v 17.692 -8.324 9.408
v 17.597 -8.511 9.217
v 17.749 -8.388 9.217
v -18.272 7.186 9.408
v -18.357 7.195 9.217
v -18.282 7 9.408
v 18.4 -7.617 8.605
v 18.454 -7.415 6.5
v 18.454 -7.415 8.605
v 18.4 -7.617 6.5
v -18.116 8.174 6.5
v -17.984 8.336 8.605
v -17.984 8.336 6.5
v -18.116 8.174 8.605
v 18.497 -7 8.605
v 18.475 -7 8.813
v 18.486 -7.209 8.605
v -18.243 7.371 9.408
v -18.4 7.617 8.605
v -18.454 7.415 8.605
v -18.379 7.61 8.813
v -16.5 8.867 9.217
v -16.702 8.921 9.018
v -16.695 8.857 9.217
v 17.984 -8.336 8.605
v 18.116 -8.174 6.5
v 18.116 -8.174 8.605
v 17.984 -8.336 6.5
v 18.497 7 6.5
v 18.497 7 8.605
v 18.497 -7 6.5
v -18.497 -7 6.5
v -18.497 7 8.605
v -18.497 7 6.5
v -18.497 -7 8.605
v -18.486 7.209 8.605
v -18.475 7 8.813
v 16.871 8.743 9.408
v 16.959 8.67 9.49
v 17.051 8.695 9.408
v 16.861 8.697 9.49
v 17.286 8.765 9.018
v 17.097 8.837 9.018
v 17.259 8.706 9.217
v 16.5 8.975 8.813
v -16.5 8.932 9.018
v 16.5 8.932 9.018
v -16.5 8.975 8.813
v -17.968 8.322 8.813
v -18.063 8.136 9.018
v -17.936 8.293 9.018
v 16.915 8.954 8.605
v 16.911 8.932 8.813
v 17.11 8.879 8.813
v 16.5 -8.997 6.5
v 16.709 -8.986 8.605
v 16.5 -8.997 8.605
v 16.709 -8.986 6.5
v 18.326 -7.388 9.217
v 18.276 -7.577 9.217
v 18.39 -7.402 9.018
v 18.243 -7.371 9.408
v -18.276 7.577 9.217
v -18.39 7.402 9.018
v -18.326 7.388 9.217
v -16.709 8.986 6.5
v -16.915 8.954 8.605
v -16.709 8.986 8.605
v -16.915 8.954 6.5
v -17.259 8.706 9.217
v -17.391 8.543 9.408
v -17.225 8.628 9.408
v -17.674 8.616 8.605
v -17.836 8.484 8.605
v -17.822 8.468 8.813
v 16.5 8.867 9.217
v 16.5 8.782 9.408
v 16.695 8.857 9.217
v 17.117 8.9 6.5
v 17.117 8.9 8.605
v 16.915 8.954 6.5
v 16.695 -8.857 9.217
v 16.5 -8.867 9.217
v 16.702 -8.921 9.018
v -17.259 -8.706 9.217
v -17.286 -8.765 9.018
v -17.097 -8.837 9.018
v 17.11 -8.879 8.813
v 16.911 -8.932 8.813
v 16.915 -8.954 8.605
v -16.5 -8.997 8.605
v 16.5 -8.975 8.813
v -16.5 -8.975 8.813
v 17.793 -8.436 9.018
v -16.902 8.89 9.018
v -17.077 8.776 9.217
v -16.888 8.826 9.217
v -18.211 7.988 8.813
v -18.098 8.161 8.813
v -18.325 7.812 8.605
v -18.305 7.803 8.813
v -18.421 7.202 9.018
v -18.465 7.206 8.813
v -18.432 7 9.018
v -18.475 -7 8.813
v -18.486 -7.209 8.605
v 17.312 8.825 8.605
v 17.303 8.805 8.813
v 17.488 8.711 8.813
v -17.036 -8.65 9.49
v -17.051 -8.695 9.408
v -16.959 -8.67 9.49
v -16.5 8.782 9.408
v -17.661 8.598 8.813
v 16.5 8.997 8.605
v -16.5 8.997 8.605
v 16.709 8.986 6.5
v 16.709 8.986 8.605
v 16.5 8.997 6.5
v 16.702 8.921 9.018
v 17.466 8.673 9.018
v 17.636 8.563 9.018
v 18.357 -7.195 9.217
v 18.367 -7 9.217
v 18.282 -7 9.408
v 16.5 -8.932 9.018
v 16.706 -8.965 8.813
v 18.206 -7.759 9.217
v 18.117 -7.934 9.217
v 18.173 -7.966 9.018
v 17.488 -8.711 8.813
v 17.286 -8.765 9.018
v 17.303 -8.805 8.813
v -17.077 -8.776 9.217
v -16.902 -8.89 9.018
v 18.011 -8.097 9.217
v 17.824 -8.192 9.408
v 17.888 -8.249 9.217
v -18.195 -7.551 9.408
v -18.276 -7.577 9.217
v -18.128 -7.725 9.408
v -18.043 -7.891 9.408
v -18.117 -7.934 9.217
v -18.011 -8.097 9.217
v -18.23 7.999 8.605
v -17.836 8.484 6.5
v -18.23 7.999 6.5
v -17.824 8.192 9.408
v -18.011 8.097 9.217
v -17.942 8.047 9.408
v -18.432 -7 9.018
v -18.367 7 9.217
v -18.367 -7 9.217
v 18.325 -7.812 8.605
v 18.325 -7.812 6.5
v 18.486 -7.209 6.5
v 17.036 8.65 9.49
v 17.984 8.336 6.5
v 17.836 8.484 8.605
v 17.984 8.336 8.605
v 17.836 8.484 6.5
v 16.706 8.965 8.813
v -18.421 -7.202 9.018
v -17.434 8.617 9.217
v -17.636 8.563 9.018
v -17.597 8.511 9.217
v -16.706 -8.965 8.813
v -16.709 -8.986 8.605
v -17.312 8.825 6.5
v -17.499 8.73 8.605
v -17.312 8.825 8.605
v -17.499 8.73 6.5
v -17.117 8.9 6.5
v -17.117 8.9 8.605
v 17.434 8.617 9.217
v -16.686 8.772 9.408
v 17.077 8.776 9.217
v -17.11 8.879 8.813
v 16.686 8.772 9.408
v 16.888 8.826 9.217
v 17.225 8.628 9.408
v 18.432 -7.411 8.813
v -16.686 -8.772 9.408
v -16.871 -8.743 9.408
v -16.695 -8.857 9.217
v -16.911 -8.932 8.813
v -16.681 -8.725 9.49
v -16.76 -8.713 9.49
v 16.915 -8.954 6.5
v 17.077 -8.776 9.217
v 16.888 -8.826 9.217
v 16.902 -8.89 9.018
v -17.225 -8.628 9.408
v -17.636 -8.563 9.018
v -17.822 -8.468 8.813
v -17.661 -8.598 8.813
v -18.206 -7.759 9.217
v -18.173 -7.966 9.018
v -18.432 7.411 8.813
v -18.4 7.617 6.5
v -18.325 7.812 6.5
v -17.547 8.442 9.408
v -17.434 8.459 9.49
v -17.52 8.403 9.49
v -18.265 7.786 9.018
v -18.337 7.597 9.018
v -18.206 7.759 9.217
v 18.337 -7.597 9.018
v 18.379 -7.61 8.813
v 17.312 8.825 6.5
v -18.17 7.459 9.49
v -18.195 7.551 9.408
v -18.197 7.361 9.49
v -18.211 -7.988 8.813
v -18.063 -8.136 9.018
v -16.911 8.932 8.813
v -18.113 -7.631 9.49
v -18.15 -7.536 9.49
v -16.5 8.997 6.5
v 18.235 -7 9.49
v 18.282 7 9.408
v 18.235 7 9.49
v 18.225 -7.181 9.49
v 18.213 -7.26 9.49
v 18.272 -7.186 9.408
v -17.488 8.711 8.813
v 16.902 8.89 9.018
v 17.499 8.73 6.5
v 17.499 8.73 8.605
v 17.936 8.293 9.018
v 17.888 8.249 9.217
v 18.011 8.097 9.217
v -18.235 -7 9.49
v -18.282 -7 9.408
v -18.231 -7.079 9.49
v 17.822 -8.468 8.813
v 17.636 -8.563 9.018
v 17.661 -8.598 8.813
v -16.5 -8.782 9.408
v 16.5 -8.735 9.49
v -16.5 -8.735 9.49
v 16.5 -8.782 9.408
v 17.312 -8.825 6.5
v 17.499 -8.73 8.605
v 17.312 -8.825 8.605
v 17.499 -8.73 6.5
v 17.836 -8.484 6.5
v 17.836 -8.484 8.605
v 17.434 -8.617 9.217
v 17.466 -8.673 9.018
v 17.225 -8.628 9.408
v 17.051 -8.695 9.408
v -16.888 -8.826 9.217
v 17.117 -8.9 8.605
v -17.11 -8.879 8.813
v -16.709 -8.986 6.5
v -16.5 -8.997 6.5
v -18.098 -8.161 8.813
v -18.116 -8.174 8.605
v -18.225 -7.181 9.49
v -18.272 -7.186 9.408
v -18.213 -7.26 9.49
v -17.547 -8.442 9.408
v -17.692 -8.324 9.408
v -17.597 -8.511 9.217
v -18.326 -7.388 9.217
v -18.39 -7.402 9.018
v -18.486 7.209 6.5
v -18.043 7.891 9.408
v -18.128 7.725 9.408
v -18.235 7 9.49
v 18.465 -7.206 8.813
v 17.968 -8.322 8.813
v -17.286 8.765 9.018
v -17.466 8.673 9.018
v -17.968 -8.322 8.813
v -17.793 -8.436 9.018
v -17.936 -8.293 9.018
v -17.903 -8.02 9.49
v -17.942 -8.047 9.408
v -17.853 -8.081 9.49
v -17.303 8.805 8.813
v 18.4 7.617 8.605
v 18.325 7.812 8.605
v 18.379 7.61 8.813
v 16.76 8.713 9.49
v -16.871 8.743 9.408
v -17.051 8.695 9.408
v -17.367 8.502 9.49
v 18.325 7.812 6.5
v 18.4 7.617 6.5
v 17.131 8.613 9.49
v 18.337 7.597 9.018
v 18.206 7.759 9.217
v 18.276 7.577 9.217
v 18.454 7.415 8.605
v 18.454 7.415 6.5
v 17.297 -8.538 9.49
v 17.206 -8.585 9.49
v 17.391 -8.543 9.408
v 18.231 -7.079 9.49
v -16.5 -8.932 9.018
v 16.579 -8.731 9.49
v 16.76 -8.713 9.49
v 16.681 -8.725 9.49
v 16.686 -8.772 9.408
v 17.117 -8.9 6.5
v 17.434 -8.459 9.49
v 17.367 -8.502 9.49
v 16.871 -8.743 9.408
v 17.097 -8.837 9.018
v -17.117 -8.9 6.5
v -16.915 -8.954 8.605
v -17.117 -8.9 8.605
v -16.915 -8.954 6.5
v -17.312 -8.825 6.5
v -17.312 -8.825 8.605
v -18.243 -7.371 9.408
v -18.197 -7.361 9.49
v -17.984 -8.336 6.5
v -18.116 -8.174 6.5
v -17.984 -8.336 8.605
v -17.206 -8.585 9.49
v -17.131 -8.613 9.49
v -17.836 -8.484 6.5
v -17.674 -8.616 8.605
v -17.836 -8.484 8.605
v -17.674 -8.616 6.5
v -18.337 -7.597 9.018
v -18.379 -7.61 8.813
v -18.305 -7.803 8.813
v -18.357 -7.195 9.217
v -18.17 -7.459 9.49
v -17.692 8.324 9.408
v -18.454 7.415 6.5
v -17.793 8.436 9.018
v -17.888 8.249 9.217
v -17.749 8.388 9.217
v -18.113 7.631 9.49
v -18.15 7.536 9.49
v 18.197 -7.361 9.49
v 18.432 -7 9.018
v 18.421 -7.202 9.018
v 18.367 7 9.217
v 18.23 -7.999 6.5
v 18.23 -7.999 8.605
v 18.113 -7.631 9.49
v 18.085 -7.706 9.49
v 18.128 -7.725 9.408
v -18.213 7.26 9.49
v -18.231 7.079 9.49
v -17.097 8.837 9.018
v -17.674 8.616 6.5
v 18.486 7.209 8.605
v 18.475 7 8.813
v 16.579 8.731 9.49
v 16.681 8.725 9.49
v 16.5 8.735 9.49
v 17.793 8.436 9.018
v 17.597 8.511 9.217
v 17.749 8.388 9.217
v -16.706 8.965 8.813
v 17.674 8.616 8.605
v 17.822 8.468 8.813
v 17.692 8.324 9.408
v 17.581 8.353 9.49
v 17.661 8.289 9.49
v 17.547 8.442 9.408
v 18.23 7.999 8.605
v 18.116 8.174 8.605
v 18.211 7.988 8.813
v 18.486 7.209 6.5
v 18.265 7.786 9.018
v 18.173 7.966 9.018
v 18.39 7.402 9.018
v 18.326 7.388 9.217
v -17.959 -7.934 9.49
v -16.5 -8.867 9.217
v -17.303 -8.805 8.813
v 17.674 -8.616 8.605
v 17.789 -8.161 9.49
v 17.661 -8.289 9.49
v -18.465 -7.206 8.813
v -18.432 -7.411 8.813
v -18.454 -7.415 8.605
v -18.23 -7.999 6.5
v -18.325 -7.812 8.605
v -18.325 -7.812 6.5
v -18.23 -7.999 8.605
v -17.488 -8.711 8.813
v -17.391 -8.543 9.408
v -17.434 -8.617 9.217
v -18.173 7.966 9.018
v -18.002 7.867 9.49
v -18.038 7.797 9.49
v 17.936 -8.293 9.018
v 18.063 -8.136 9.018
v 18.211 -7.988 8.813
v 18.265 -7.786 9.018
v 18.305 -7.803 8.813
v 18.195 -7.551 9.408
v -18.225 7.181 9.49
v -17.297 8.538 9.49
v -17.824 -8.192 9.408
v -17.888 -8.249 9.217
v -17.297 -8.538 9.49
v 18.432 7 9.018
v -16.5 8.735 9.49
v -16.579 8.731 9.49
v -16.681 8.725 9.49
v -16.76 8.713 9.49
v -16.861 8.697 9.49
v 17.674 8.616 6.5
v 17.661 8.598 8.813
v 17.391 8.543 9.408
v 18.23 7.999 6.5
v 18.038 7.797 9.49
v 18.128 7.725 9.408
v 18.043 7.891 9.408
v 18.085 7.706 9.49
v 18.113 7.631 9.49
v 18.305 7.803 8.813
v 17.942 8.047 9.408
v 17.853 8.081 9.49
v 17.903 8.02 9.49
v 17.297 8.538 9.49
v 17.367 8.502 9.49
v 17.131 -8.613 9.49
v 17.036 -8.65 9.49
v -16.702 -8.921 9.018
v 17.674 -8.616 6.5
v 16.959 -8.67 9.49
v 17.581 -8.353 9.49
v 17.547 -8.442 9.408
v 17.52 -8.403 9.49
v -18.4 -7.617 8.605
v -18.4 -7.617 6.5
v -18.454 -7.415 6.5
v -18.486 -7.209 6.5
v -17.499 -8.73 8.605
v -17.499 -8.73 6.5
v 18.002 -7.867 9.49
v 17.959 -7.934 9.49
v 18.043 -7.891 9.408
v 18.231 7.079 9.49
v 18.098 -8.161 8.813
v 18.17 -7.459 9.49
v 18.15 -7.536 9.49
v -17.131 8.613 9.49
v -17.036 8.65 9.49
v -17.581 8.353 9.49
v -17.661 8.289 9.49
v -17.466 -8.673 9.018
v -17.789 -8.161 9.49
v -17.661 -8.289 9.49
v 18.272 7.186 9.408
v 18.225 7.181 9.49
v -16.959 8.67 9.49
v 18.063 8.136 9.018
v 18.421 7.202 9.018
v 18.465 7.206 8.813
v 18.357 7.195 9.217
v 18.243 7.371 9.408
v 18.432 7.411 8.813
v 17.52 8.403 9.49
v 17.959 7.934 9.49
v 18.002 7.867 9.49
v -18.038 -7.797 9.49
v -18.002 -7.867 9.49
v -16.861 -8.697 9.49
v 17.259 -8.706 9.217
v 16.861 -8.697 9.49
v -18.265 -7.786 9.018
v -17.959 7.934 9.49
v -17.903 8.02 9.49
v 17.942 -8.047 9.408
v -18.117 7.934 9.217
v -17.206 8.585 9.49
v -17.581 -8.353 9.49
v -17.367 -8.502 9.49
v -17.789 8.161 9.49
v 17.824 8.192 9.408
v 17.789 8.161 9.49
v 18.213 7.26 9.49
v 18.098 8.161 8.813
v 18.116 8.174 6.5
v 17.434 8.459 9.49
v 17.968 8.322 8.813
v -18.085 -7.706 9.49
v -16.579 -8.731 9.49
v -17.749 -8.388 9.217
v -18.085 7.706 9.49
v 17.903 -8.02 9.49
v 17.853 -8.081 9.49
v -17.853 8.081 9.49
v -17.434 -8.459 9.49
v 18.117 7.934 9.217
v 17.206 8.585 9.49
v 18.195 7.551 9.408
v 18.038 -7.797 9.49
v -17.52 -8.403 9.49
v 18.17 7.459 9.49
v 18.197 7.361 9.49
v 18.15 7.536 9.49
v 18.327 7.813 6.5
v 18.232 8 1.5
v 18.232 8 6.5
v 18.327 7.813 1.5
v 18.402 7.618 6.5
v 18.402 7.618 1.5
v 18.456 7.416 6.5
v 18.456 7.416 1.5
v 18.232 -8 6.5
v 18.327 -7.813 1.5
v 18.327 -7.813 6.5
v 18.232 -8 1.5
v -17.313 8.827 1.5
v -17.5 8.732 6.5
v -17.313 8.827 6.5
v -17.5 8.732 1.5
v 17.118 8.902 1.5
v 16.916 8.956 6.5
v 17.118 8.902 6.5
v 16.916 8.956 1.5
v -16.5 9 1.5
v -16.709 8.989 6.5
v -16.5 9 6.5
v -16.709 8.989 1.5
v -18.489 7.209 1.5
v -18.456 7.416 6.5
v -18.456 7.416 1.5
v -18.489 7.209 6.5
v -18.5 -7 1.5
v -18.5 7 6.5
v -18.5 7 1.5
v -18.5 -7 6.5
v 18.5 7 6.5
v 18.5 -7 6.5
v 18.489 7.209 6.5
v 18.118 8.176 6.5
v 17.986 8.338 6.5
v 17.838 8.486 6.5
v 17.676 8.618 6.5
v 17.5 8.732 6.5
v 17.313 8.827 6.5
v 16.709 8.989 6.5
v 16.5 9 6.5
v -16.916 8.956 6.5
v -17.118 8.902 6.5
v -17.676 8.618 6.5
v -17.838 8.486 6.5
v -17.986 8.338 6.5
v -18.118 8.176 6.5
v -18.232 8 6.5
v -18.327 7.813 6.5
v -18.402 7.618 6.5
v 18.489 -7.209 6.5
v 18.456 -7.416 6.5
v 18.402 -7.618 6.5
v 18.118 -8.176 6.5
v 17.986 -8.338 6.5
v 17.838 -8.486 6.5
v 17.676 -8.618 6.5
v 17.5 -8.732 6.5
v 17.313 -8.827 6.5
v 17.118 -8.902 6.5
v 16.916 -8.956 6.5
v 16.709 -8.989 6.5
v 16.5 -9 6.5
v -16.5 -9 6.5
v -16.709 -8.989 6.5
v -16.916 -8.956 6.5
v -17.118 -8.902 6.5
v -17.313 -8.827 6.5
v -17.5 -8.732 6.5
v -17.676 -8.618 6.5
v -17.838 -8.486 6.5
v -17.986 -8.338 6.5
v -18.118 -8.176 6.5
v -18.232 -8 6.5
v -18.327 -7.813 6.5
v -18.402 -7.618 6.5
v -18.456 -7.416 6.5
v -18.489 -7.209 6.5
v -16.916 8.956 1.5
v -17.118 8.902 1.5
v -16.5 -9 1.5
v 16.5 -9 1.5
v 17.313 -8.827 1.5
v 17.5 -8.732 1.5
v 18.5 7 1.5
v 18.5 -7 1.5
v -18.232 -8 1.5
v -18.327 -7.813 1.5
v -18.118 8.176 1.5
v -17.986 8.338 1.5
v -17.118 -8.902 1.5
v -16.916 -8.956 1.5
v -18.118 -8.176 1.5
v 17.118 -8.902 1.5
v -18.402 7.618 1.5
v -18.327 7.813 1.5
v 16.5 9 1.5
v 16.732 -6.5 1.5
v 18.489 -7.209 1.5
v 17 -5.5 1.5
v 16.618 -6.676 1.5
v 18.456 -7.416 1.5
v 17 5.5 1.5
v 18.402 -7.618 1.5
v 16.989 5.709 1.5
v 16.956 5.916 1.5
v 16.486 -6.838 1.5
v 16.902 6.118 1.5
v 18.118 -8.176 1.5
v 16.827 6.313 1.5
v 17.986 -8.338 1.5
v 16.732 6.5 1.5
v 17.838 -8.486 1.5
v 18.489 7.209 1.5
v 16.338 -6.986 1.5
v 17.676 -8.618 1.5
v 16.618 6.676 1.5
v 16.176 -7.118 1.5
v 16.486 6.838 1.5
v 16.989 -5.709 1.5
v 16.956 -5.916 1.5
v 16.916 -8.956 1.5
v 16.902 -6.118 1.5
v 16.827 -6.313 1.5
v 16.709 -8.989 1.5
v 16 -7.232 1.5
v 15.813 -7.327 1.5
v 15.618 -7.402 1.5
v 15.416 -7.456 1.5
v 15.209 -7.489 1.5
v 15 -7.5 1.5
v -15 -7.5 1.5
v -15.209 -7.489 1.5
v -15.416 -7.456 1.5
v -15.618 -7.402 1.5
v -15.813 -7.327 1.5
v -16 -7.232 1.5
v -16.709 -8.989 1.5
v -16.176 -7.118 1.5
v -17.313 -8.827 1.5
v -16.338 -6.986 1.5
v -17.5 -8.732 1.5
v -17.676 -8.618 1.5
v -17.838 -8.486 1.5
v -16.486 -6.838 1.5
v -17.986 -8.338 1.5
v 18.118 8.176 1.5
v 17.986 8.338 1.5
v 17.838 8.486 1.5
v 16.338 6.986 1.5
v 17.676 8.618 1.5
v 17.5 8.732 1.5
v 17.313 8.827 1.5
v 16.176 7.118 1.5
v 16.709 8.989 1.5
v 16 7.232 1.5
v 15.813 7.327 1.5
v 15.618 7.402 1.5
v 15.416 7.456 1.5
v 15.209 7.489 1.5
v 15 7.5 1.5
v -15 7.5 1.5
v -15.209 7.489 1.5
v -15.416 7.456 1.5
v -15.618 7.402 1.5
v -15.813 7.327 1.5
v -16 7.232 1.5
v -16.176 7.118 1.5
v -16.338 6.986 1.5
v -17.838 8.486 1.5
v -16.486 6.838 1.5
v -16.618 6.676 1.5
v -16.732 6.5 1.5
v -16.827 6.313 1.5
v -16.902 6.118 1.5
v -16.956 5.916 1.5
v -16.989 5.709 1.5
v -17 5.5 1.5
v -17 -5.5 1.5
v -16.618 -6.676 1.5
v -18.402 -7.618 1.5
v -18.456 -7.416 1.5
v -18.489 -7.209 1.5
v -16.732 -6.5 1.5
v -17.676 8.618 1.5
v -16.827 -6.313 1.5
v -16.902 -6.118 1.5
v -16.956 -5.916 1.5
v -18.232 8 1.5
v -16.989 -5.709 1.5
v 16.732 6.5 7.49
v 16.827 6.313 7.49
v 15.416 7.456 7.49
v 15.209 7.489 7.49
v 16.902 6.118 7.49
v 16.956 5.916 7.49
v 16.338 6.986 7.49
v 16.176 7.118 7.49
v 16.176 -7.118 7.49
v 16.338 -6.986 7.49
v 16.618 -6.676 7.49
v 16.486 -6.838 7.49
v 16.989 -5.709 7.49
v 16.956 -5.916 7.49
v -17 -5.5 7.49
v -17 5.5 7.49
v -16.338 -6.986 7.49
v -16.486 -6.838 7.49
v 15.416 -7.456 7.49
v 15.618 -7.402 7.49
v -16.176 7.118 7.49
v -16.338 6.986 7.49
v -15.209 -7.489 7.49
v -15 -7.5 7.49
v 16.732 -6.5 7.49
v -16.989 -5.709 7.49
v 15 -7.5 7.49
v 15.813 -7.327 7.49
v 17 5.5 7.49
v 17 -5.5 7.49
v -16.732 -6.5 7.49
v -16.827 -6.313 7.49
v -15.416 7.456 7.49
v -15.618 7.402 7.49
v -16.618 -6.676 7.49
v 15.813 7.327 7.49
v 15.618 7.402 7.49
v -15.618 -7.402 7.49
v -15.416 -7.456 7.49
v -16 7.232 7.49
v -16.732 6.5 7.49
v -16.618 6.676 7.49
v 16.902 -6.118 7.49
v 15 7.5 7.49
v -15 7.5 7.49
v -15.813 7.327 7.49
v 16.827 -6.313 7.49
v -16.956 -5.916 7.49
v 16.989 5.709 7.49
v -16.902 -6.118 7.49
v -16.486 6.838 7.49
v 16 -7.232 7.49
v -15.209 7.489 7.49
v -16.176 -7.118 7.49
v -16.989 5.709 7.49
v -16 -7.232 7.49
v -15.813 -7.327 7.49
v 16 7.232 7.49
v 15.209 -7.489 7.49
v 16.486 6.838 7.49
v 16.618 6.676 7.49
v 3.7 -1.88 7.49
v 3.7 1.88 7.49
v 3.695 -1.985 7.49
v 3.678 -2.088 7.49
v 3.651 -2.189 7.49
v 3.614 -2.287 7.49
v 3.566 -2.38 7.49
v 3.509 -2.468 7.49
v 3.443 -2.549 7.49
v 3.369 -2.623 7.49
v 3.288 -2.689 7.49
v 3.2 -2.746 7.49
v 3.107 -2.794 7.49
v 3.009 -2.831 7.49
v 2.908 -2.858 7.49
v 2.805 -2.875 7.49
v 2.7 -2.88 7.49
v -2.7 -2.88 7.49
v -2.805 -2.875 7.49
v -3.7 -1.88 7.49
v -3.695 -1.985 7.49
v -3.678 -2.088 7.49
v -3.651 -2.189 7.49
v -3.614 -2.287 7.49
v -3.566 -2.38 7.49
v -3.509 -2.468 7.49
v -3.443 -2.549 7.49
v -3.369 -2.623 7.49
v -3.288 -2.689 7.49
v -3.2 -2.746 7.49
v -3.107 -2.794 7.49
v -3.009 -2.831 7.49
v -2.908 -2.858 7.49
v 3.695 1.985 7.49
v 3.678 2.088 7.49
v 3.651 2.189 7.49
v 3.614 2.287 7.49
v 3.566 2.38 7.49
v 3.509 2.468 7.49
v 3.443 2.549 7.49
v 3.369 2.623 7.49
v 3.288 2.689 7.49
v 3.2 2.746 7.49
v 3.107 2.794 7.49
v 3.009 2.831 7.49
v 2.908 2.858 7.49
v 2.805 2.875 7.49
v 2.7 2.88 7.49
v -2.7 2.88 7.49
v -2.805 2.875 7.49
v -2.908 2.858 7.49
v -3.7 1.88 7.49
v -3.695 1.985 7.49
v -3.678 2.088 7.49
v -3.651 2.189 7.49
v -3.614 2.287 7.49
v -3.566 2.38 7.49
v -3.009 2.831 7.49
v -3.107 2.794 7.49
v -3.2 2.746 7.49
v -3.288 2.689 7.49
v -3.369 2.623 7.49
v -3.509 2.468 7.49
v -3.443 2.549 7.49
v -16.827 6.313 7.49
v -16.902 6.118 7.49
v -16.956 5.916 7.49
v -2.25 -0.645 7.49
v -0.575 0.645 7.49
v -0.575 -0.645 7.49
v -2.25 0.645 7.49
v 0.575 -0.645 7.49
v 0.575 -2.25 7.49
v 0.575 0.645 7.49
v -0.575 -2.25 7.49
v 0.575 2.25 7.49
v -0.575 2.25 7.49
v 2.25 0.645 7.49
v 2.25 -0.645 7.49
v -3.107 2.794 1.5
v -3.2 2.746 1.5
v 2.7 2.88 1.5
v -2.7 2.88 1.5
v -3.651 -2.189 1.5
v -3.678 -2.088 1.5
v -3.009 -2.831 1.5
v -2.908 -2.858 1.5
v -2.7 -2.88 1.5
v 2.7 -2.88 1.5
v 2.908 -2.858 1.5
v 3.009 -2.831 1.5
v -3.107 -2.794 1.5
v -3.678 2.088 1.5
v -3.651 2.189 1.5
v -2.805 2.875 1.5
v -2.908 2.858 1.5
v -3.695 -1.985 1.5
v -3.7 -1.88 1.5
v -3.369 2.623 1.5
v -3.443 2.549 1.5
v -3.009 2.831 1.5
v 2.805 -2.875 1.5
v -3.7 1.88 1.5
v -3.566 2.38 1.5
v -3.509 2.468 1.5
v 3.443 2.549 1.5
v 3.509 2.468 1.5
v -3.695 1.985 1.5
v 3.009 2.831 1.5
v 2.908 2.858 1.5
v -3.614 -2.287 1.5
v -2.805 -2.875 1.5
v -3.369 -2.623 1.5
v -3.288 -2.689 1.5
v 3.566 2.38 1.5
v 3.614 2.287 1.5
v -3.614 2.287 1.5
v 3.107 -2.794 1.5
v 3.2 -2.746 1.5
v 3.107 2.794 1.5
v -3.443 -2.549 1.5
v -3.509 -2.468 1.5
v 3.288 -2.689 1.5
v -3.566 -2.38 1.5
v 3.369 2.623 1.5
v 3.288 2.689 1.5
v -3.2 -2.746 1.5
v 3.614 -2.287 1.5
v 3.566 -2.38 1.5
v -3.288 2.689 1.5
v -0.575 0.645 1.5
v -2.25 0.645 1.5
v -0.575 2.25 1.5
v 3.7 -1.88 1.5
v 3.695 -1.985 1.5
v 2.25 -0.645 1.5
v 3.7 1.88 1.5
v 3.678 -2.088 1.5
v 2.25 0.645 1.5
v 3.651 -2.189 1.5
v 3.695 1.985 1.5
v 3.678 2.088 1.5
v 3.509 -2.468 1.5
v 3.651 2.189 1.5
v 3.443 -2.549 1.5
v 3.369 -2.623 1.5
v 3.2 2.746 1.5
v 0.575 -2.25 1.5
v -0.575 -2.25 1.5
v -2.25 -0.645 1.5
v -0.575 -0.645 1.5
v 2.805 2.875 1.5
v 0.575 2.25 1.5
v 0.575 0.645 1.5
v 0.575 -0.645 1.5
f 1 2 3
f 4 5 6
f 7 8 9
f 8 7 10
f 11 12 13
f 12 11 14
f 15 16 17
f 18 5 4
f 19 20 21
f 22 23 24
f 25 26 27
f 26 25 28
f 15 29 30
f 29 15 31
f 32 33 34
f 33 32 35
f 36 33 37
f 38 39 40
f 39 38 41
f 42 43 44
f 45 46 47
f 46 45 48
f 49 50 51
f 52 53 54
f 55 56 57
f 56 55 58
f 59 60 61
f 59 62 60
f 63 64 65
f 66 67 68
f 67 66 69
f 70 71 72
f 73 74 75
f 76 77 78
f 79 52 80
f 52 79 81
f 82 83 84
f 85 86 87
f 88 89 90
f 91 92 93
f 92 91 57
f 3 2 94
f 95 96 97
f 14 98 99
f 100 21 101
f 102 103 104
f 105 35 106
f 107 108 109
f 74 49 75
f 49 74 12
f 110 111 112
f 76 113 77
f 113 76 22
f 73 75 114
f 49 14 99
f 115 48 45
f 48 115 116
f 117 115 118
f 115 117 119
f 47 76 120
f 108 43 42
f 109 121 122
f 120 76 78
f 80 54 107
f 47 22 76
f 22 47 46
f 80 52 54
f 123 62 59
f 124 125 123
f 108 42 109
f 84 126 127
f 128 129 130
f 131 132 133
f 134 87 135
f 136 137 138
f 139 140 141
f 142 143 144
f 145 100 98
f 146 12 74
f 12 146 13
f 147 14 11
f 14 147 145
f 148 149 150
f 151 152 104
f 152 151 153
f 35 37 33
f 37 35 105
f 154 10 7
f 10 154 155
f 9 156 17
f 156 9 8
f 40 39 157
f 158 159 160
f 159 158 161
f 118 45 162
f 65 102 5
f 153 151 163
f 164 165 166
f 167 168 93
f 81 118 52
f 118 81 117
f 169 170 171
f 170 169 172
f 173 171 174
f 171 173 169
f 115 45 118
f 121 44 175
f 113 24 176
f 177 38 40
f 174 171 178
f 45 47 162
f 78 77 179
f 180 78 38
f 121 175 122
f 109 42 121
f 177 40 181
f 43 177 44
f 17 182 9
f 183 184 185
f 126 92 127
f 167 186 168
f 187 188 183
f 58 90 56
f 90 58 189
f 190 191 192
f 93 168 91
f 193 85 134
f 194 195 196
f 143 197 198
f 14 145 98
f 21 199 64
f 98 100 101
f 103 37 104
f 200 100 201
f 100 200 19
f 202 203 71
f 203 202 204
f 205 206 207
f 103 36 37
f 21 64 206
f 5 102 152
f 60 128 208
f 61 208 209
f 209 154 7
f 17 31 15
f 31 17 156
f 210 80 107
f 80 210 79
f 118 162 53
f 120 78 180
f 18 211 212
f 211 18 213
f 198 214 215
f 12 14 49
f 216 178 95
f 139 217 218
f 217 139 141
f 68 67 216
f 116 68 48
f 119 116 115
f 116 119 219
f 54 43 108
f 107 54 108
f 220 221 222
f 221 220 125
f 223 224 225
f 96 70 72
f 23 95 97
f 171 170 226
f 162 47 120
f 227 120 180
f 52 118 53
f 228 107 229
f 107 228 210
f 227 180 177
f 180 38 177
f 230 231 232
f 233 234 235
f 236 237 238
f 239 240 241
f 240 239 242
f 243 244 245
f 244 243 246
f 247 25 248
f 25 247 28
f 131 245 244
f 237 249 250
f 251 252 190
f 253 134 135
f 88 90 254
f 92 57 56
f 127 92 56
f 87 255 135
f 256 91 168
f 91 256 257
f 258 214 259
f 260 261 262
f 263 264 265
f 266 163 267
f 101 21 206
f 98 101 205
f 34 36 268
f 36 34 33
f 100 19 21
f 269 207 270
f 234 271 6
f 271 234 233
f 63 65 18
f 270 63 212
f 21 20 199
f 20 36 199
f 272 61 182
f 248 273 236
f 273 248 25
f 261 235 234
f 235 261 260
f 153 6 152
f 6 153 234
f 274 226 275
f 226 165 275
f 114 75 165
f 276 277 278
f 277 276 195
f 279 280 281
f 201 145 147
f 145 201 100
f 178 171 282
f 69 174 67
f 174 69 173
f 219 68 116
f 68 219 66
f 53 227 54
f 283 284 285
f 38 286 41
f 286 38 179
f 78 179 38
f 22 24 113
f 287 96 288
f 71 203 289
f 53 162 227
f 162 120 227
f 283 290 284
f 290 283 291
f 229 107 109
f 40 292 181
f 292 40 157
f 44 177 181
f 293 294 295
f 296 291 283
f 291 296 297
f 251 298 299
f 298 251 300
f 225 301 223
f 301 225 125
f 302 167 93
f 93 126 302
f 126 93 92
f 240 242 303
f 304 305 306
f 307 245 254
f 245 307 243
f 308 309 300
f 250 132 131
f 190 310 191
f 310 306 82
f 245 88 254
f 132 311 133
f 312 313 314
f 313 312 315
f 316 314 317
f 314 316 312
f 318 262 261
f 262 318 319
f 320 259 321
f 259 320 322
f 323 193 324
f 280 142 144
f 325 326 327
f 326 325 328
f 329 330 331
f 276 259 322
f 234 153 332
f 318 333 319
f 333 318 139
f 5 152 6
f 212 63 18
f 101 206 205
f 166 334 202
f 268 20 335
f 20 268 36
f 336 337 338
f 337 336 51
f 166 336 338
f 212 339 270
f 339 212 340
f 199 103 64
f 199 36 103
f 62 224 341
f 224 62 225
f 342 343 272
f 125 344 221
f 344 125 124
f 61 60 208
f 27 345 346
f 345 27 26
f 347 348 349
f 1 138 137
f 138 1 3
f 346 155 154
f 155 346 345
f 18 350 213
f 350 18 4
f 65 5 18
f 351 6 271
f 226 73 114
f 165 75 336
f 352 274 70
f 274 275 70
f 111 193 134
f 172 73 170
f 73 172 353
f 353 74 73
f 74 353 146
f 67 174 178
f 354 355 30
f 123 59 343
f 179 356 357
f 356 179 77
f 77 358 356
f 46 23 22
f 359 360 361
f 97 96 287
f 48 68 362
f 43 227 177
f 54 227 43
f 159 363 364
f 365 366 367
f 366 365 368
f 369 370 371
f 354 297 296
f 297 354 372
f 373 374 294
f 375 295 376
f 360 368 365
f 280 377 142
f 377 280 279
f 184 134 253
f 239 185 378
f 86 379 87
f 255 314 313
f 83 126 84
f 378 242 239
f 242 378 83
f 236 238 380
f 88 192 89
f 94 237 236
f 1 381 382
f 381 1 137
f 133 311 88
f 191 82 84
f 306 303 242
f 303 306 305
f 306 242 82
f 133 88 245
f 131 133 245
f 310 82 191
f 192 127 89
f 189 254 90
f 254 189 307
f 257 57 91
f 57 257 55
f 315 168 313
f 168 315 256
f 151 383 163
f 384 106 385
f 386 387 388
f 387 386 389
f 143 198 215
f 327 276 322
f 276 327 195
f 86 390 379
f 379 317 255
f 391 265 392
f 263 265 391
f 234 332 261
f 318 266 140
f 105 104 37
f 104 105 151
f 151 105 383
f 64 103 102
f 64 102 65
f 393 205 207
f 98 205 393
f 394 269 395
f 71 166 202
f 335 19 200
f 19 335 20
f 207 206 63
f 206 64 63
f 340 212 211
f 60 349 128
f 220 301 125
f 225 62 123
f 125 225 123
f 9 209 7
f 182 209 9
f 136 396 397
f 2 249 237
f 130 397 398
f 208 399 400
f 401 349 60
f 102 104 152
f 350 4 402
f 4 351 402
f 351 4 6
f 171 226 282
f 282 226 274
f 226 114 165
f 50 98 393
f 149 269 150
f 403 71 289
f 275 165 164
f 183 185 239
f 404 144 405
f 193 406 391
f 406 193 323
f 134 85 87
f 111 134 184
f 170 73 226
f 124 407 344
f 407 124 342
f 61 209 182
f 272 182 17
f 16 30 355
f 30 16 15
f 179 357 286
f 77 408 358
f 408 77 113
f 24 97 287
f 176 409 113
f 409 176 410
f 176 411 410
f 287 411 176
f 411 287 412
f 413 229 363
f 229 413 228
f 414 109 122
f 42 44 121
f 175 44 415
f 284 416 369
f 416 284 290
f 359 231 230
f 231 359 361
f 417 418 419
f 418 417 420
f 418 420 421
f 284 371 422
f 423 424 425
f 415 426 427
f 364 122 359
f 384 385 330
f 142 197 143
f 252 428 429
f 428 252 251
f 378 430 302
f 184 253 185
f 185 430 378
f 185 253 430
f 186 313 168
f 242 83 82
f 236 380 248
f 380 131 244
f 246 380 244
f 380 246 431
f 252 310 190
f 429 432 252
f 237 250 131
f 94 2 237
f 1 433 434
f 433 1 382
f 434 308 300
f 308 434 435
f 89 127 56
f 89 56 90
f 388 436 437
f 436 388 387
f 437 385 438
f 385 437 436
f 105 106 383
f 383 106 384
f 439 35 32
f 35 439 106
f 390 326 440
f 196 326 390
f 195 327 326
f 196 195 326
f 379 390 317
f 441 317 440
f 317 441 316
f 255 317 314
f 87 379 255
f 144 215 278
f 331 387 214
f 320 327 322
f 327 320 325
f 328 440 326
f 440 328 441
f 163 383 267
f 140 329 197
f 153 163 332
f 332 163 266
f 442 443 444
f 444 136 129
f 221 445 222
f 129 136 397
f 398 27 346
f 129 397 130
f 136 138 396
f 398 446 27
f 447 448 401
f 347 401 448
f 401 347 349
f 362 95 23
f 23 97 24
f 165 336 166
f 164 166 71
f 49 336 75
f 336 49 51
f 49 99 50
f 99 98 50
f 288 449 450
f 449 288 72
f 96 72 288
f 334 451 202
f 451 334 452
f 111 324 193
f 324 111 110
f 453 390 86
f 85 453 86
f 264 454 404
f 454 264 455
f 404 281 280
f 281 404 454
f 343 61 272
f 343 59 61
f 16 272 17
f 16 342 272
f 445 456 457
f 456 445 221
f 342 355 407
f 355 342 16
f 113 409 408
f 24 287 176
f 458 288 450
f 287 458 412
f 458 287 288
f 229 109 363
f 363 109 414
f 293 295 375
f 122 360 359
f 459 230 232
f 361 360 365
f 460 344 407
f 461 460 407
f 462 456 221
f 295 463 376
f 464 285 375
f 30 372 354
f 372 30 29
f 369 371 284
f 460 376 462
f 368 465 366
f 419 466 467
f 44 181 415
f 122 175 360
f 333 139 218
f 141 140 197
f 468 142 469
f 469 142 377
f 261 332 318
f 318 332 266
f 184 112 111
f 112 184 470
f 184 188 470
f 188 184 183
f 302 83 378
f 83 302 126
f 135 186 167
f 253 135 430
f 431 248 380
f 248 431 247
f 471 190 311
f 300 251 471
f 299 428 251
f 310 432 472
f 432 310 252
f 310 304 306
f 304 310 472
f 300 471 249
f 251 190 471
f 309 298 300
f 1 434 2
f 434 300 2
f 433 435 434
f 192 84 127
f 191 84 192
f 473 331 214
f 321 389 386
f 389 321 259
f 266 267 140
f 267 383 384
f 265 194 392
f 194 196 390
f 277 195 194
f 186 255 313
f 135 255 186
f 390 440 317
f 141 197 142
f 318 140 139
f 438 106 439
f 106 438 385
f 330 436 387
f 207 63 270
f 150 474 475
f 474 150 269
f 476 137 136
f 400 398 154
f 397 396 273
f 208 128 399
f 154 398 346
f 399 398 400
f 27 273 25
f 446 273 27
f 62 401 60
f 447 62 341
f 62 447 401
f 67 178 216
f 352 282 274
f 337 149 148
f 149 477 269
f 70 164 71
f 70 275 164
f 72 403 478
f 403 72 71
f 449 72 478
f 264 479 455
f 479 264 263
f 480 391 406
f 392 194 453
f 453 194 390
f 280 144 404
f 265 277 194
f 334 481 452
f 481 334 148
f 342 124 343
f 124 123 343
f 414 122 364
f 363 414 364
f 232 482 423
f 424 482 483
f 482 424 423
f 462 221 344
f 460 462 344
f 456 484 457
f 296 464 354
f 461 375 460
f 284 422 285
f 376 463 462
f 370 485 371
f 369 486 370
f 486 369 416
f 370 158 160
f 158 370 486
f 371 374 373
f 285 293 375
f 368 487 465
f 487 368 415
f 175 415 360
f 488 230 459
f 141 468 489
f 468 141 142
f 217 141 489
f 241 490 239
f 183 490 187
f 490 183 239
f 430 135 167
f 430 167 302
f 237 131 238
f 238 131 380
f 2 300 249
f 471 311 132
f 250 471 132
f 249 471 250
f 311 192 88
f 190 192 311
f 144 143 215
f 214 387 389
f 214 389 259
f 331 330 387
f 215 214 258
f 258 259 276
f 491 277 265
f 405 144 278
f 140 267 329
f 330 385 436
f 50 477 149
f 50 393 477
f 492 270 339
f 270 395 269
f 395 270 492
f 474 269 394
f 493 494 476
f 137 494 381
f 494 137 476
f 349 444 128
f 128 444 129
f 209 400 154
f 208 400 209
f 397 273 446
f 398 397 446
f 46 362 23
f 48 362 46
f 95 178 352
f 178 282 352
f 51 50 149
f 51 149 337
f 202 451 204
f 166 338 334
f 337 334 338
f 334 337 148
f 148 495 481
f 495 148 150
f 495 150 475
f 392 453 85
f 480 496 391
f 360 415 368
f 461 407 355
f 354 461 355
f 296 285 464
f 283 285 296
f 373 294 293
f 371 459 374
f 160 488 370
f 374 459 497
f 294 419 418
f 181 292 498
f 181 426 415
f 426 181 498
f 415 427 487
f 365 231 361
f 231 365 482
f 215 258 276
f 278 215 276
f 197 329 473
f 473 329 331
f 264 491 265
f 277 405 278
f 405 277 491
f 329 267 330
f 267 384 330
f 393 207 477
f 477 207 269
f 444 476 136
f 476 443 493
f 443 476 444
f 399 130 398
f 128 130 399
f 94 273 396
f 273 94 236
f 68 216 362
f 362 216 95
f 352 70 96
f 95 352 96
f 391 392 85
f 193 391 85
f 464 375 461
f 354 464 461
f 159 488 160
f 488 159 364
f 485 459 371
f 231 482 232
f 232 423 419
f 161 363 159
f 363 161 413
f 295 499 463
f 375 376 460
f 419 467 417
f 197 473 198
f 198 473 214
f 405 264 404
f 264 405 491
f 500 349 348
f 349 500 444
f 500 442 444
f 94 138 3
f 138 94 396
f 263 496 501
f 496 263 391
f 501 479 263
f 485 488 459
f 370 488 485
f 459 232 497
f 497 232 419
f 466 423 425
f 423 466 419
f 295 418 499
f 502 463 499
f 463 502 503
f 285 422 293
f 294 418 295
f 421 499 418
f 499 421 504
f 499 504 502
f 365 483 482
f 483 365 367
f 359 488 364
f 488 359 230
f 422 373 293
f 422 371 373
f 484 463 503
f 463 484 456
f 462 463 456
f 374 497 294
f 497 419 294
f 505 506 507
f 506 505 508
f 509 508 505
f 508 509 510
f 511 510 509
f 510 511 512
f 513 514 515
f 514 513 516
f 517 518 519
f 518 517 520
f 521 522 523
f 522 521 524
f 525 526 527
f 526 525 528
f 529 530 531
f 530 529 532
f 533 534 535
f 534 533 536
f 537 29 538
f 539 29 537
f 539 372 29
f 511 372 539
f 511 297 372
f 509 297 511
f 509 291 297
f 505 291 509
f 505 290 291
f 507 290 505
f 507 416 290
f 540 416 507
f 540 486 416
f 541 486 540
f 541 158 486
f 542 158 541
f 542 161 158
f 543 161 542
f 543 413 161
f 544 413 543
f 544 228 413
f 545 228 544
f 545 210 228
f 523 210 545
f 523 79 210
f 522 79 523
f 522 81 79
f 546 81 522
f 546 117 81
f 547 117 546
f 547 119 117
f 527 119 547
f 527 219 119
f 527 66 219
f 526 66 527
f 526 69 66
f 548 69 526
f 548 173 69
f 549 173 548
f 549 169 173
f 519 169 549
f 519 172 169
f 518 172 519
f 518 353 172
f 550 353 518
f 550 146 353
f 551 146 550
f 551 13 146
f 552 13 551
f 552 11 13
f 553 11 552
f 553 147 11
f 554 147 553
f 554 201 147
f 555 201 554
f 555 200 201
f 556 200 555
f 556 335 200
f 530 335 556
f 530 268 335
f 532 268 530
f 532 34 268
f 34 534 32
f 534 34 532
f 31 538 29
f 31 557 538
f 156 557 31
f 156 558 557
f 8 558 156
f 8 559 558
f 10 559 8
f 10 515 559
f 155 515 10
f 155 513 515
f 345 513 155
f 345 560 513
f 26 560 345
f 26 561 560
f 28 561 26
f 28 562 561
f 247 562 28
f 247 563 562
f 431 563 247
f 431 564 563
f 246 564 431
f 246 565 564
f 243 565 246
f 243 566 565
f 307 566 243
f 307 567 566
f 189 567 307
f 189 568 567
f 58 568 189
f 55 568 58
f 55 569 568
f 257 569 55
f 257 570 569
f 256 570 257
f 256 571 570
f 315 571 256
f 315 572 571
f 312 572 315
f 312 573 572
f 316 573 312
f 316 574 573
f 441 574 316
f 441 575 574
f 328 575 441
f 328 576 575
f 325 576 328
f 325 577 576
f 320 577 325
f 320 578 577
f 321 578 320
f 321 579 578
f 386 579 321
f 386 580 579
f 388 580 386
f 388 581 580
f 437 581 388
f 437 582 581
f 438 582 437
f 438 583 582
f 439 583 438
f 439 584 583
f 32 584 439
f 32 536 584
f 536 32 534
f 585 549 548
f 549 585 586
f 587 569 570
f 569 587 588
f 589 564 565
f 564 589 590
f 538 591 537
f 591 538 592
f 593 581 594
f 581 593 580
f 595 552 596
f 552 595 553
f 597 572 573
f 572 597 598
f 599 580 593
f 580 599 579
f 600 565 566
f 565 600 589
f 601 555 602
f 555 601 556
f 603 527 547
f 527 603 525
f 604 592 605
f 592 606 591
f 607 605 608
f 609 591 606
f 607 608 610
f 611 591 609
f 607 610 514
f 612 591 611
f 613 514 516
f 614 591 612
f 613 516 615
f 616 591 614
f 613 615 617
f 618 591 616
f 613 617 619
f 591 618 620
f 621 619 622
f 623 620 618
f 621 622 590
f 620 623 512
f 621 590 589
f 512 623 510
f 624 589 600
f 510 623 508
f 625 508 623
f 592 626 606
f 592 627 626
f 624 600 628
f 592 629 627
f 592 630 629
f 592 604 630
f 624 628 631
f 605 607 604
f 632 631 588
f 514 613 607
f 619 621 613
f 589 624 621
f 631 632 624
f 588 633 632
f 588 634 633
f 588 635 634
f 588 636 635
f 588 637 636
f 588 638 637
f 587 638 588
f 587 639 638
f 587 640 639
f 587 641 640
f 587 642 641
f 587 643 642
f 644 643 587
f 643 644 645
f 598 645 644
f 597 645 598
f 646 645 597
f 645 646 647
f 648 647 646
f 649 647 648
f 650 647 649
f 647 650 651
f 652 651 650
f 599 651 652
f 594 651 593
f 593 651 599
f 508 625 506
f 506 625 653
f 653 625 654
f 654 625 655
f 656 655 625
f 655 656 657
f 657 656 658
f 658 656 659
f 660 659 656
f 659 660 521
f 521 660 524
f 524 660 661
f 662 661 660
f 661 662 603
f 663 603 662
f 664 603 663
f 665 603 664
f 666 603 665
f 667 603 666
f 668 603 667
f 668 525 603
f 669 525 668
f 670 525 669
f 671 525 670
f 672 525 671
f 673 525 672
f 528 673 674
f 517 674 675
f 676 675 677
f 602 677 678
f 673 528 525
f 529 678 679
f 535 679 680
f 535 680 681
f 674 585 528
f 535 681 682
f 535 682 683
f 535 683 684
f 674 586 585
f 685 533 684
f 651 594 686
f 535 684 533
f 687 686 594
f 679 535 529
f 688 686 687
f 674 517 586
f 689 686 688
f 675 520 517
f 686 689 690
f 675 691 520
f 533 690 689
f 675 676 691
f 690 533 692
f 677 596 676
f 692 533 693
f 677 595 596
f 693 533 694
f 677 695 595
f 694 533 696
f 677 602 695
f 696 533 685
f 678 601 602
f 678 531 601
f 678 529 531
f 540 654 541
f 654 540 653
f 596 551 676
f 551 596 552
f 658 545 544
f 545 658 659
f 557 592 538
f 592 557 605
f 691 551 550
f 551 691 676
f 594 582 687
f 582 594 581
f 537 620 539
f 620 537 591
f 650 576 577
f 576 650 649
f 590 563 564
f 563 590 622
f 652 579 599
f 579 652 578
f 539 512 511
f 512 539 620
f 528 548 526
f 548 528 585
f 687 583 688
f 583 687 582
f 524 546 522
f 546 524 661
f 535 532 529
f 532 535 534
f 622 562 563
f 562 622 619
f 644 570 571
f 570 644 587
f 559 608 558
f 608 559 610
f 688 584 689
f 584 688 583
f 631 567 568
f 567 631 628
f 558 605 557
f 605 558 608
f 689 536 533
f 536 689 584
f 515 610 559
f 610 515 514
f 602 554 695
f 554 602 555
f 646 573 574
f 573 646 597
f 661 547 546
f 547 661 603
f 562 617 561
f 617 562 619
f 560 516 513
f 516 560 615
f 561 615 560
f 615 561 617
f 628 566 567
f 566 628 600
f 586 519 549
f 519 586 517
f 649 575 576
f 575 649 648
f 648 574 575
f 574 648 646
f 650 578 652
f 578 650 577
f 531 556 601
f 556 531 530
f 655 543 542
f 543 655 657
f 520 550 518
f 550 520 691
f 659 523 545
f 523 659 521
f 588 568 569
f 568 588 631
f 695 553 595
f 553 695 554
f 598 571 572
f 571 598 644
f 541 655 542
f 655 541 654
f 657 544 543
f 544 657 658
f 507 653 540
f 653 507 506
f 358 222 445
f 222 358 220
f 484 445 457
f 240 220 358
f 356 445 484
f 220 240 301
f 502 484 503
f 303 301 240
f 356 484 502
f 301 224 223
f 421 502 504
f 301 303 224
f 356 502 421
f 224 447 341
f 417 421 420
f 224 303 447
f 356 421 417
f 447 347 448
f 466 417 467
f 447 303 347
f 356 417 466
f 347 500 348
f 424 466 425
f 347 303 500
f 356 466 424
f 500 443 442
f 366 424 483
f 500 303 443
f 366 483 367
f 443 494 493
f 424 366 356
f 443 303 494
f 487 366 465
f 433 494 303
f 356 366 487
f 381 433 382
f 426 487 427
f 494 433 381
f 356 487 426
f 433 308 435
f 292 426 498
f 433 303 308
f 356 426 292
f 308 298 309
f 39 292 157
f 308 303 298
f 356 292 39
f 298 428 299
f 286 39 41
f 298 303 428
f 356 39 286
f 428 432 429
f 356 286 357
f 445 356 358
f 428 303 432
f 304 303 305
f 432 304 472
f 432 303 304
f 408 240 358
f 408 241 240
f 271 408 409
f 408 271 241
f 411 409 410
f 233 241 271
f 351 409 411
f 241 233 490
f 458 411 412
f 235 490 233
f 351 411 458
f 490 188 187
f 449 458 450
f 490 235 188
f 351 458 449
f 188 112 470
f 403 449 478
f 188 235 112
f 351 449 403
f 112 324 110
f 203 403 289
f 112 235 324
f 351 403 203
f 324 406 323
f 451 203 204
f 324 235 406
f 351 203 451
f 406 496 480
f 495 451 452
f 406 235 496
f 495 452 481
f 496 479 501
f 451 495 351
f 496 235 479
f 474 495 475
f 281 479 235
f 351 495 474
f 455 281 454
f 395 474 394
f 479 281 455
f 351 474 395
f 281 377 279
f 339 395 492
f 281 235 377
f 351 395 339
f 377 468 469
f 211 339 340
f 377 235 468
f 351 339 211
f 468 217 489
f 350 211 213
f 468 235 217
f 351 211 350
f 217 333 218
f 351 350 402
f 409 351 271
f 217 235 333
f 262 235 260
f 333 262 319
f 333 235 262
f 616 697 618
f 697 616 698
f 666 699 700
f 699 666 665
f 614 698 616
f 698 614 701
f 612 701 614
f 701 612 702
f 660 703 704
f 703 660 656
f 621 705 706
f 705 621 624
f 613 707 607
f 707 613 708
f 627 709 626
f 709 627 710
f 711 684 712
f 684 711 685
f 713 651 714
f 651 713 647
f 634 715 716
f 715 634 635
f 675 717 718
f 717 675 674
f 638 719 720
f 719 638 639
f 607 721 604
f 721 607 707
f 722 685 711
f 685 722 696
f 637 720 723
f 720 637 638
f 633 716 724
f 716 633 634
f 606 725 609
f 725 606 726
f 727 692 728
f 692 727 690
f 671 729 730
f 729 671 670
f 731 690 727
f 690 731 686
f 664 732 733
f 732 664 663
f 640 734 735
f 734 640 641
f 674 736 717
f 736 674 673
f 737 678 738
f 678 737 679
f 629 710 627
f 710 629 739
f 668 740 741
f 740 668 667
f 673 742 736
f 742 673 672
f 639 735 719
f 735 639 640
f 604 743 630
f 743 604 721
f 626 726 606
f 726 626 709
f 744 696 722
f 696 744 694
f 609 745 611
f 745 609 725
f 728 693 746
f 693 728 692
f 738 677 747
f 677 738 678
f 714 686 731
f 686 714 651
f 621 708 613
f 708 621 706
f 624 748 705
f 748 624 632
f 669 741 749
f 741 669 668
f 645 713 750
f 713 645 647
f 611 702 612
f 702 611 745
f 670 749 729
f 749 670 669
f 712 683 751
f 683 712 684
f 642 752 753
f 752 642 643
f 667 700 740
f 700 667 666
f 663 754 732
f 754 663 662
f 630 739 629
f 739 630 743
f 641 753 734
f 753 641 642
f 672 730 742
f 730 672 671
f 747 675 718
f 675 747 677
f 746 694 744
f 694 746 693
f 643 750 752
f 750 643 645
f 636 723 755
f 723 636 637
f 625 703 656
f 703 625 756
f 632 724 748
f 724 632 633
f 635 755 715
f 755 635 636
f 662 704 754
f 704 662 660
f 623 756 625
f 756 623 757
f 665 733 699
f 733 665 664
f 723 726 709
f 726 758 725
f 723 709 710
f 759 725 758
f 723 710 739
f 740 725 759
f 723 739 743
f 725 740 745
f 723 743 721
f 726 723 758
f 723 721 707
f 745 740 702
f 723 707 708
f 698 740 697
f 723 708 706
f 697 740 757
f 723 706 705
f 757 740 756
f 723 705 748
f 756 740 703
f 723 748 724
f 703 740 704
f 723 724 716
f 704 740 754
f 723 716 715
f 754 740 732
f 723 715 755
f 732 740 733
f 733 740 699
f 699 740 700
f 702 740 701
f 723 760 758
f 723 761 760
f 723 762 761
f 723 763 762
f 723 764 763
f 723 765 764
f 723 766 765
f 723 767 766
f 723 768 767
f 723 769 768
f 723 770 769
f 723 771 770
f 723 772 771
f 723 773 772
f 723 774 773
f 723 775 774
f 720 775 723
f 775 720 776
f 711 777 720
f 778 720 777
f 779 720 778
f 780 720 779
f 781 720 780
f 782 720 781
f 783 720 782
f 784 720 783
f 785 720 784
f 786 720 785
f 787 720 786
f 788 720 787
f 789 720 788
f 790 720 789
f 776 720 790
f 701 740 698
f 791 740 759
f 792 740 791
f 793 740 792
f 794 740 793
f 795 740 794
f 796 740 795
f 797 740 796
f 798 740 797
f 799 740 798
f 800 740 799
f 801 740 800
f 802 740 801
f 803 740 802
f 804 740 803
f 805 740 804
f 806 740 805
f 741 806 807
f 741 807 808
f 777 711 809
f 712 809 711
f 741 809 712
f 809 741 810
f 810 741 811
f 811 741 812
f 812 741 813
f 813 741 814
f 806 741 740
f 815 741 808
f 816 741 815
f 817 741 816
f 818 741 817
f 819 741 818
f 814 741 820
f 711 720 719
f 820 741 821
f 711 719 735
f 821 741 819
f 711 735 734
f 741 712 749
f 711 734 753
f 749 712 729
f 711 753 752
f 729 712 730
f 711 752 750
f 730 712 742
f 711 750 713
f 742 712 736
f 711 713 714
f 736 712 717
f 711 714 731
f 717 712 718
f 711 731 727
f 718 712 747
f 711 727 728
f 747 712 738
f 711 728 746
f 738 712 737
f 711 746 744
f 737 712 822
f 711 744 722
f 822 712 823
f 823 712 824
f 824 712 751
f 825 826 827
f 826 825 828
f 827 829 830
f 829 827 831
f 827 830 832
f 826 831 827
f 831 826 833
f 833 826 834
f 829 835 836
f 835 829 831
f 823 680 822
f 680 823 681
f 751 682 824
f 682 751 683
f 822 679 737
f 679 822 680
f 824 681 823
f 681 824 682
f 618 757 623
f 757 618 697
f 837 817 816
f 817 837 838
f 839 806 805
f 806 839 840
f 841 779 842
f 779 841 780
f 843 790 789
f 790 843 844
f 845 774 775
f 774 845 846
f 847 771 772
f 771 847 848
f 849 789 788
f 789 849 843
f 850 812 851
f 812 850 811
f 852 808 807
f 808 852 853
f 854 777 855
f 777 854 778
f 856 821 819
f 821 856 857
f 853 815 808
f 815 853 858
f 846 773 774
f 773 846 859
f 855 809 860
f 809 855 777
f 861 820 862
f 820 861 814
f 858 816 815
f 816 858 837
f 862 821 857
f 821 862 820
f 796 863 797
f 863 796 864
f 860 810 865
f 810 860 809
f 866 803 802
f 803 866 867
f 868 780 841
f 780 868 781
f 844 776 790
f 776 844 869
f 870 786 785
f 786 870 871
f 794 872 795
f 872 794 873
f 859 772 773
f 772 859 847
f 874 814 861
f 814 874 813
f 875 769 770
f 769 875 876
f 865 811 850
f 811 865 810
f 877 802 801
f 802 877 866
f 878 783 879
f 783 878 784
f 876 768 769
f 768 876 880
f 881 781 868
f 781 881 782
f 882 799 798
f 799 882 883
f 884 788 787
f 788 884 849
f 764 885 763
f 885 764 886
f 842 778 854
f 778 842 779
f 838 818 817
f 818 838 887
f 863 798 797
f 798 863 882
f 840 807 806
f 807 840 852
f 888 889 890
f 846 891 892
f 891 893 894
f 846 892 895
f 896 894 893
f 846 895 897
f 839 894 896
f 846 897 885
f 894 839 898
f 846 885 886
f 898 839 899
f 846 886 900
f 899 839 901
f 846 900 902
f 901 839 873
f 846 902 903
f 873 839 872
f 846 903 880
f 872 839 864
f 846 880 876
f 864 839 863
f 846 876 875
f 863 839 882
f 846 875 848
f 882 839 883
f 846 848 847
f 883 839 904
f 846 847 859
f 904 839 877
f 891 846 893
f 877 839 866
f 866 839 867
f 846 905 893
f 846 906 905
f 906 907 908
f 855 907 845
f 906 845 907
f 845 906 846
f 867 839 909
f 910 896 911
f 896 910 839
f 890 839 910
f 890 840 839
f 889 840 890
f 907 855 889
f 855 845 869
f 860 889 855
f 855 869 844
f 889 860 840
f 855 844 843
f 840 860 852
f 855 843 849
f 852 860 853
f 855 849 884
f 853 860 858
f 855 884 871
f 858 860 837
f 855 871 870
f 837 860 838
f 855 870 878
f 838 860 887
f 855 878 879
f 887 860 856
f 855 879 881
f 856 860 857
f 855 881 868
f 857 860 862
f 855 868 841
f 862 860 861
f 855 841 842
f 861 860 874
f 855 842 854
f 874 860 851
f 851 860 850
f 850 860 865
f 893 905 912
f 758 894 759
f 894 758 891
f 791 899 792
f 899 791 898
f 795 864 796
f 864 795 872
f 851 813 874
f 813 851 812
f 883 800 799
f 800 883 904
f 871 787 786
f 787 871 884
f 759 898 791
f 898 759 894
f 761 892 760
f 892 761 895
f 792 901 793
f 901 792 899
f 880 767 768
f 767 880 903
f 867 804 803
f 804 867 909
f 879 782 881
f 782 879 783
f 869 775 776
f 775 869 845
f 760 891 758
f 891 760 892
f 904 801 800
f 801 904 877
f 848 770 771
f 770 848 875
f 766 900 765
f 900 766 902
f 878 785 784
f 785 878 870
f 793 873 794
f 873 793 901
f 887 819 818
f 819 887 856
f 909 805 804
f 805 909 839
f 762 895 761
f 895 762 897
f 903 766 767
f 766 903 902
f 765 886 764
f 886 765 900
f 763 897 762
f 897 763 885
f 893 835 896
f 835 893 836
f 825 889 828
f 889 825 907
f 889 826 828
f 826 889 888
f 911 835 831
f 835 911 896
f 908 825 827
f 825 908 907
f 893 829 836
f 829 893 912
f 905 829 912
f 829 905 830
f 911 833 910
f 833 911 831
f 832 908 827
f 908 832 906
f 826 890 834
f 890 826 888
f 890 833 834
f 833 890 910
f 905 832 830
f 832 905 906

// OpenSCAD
// Define higher resolution for transformations
$fn=60;

difference() {
union(){
    // keycap outside cupola
    difference() {
        union() {
            // Top bezel is 2mm but should be 1mm, let's see how it prints first
            // rounded cap - top half
            translate([0,0,7.5]) // half mil under ten
            minkowski() {
                cube([37-2*2, 18-2*2, 6-2*2], true);
                sphere(2);
            };

            // rounded sides - bottom half
            translate([0,0,1.5])
            linear_extrude(height=5)
            minkowski() {
                square([37-2*2, 18-2*2], true);
                circle(2);
            };
        };

        // top flattening
        translate([0,0,9.49])
        sideroundedcube(38, 6, 2);

        // internal cupola cutoff
        translate([0,0,1.49])
        linear_extrude(height=6)
        minkowski() {
            square([34-2*2, 15-2*2], true);
            circle(2);
        };
    }

    // fitting support
    translate([0, 0, 4.75])
    difference(){
        // housing fitting
        hull() {
            translate([2.70, 1.88, 0])   cylinder(6.5, 1, 1, true);
            translate([-2.70, 1.88, 0])  cylinder(6.5, 1, 1, true);
            translate([2.70, -1.88, 0])  cylinder(6.5, 1, 1, true);
            translate([-2.70, -1.88, 0]) cylinder(6.5, 1, 1, true);
        }
        // cross fitting cutoff
        cube([4.5, 1.29, 10], true);
        cube([1.15, 4.5, 10], true);
    }
}
*translate([0, 10, 0]) cube([40, 20, 20], true);
}


module sideroundedcube(s, h, r) {
    linear_extrude(height=h)
    minkowski() {
        square(s-r*2, true);
        circle(r);
    };
}
